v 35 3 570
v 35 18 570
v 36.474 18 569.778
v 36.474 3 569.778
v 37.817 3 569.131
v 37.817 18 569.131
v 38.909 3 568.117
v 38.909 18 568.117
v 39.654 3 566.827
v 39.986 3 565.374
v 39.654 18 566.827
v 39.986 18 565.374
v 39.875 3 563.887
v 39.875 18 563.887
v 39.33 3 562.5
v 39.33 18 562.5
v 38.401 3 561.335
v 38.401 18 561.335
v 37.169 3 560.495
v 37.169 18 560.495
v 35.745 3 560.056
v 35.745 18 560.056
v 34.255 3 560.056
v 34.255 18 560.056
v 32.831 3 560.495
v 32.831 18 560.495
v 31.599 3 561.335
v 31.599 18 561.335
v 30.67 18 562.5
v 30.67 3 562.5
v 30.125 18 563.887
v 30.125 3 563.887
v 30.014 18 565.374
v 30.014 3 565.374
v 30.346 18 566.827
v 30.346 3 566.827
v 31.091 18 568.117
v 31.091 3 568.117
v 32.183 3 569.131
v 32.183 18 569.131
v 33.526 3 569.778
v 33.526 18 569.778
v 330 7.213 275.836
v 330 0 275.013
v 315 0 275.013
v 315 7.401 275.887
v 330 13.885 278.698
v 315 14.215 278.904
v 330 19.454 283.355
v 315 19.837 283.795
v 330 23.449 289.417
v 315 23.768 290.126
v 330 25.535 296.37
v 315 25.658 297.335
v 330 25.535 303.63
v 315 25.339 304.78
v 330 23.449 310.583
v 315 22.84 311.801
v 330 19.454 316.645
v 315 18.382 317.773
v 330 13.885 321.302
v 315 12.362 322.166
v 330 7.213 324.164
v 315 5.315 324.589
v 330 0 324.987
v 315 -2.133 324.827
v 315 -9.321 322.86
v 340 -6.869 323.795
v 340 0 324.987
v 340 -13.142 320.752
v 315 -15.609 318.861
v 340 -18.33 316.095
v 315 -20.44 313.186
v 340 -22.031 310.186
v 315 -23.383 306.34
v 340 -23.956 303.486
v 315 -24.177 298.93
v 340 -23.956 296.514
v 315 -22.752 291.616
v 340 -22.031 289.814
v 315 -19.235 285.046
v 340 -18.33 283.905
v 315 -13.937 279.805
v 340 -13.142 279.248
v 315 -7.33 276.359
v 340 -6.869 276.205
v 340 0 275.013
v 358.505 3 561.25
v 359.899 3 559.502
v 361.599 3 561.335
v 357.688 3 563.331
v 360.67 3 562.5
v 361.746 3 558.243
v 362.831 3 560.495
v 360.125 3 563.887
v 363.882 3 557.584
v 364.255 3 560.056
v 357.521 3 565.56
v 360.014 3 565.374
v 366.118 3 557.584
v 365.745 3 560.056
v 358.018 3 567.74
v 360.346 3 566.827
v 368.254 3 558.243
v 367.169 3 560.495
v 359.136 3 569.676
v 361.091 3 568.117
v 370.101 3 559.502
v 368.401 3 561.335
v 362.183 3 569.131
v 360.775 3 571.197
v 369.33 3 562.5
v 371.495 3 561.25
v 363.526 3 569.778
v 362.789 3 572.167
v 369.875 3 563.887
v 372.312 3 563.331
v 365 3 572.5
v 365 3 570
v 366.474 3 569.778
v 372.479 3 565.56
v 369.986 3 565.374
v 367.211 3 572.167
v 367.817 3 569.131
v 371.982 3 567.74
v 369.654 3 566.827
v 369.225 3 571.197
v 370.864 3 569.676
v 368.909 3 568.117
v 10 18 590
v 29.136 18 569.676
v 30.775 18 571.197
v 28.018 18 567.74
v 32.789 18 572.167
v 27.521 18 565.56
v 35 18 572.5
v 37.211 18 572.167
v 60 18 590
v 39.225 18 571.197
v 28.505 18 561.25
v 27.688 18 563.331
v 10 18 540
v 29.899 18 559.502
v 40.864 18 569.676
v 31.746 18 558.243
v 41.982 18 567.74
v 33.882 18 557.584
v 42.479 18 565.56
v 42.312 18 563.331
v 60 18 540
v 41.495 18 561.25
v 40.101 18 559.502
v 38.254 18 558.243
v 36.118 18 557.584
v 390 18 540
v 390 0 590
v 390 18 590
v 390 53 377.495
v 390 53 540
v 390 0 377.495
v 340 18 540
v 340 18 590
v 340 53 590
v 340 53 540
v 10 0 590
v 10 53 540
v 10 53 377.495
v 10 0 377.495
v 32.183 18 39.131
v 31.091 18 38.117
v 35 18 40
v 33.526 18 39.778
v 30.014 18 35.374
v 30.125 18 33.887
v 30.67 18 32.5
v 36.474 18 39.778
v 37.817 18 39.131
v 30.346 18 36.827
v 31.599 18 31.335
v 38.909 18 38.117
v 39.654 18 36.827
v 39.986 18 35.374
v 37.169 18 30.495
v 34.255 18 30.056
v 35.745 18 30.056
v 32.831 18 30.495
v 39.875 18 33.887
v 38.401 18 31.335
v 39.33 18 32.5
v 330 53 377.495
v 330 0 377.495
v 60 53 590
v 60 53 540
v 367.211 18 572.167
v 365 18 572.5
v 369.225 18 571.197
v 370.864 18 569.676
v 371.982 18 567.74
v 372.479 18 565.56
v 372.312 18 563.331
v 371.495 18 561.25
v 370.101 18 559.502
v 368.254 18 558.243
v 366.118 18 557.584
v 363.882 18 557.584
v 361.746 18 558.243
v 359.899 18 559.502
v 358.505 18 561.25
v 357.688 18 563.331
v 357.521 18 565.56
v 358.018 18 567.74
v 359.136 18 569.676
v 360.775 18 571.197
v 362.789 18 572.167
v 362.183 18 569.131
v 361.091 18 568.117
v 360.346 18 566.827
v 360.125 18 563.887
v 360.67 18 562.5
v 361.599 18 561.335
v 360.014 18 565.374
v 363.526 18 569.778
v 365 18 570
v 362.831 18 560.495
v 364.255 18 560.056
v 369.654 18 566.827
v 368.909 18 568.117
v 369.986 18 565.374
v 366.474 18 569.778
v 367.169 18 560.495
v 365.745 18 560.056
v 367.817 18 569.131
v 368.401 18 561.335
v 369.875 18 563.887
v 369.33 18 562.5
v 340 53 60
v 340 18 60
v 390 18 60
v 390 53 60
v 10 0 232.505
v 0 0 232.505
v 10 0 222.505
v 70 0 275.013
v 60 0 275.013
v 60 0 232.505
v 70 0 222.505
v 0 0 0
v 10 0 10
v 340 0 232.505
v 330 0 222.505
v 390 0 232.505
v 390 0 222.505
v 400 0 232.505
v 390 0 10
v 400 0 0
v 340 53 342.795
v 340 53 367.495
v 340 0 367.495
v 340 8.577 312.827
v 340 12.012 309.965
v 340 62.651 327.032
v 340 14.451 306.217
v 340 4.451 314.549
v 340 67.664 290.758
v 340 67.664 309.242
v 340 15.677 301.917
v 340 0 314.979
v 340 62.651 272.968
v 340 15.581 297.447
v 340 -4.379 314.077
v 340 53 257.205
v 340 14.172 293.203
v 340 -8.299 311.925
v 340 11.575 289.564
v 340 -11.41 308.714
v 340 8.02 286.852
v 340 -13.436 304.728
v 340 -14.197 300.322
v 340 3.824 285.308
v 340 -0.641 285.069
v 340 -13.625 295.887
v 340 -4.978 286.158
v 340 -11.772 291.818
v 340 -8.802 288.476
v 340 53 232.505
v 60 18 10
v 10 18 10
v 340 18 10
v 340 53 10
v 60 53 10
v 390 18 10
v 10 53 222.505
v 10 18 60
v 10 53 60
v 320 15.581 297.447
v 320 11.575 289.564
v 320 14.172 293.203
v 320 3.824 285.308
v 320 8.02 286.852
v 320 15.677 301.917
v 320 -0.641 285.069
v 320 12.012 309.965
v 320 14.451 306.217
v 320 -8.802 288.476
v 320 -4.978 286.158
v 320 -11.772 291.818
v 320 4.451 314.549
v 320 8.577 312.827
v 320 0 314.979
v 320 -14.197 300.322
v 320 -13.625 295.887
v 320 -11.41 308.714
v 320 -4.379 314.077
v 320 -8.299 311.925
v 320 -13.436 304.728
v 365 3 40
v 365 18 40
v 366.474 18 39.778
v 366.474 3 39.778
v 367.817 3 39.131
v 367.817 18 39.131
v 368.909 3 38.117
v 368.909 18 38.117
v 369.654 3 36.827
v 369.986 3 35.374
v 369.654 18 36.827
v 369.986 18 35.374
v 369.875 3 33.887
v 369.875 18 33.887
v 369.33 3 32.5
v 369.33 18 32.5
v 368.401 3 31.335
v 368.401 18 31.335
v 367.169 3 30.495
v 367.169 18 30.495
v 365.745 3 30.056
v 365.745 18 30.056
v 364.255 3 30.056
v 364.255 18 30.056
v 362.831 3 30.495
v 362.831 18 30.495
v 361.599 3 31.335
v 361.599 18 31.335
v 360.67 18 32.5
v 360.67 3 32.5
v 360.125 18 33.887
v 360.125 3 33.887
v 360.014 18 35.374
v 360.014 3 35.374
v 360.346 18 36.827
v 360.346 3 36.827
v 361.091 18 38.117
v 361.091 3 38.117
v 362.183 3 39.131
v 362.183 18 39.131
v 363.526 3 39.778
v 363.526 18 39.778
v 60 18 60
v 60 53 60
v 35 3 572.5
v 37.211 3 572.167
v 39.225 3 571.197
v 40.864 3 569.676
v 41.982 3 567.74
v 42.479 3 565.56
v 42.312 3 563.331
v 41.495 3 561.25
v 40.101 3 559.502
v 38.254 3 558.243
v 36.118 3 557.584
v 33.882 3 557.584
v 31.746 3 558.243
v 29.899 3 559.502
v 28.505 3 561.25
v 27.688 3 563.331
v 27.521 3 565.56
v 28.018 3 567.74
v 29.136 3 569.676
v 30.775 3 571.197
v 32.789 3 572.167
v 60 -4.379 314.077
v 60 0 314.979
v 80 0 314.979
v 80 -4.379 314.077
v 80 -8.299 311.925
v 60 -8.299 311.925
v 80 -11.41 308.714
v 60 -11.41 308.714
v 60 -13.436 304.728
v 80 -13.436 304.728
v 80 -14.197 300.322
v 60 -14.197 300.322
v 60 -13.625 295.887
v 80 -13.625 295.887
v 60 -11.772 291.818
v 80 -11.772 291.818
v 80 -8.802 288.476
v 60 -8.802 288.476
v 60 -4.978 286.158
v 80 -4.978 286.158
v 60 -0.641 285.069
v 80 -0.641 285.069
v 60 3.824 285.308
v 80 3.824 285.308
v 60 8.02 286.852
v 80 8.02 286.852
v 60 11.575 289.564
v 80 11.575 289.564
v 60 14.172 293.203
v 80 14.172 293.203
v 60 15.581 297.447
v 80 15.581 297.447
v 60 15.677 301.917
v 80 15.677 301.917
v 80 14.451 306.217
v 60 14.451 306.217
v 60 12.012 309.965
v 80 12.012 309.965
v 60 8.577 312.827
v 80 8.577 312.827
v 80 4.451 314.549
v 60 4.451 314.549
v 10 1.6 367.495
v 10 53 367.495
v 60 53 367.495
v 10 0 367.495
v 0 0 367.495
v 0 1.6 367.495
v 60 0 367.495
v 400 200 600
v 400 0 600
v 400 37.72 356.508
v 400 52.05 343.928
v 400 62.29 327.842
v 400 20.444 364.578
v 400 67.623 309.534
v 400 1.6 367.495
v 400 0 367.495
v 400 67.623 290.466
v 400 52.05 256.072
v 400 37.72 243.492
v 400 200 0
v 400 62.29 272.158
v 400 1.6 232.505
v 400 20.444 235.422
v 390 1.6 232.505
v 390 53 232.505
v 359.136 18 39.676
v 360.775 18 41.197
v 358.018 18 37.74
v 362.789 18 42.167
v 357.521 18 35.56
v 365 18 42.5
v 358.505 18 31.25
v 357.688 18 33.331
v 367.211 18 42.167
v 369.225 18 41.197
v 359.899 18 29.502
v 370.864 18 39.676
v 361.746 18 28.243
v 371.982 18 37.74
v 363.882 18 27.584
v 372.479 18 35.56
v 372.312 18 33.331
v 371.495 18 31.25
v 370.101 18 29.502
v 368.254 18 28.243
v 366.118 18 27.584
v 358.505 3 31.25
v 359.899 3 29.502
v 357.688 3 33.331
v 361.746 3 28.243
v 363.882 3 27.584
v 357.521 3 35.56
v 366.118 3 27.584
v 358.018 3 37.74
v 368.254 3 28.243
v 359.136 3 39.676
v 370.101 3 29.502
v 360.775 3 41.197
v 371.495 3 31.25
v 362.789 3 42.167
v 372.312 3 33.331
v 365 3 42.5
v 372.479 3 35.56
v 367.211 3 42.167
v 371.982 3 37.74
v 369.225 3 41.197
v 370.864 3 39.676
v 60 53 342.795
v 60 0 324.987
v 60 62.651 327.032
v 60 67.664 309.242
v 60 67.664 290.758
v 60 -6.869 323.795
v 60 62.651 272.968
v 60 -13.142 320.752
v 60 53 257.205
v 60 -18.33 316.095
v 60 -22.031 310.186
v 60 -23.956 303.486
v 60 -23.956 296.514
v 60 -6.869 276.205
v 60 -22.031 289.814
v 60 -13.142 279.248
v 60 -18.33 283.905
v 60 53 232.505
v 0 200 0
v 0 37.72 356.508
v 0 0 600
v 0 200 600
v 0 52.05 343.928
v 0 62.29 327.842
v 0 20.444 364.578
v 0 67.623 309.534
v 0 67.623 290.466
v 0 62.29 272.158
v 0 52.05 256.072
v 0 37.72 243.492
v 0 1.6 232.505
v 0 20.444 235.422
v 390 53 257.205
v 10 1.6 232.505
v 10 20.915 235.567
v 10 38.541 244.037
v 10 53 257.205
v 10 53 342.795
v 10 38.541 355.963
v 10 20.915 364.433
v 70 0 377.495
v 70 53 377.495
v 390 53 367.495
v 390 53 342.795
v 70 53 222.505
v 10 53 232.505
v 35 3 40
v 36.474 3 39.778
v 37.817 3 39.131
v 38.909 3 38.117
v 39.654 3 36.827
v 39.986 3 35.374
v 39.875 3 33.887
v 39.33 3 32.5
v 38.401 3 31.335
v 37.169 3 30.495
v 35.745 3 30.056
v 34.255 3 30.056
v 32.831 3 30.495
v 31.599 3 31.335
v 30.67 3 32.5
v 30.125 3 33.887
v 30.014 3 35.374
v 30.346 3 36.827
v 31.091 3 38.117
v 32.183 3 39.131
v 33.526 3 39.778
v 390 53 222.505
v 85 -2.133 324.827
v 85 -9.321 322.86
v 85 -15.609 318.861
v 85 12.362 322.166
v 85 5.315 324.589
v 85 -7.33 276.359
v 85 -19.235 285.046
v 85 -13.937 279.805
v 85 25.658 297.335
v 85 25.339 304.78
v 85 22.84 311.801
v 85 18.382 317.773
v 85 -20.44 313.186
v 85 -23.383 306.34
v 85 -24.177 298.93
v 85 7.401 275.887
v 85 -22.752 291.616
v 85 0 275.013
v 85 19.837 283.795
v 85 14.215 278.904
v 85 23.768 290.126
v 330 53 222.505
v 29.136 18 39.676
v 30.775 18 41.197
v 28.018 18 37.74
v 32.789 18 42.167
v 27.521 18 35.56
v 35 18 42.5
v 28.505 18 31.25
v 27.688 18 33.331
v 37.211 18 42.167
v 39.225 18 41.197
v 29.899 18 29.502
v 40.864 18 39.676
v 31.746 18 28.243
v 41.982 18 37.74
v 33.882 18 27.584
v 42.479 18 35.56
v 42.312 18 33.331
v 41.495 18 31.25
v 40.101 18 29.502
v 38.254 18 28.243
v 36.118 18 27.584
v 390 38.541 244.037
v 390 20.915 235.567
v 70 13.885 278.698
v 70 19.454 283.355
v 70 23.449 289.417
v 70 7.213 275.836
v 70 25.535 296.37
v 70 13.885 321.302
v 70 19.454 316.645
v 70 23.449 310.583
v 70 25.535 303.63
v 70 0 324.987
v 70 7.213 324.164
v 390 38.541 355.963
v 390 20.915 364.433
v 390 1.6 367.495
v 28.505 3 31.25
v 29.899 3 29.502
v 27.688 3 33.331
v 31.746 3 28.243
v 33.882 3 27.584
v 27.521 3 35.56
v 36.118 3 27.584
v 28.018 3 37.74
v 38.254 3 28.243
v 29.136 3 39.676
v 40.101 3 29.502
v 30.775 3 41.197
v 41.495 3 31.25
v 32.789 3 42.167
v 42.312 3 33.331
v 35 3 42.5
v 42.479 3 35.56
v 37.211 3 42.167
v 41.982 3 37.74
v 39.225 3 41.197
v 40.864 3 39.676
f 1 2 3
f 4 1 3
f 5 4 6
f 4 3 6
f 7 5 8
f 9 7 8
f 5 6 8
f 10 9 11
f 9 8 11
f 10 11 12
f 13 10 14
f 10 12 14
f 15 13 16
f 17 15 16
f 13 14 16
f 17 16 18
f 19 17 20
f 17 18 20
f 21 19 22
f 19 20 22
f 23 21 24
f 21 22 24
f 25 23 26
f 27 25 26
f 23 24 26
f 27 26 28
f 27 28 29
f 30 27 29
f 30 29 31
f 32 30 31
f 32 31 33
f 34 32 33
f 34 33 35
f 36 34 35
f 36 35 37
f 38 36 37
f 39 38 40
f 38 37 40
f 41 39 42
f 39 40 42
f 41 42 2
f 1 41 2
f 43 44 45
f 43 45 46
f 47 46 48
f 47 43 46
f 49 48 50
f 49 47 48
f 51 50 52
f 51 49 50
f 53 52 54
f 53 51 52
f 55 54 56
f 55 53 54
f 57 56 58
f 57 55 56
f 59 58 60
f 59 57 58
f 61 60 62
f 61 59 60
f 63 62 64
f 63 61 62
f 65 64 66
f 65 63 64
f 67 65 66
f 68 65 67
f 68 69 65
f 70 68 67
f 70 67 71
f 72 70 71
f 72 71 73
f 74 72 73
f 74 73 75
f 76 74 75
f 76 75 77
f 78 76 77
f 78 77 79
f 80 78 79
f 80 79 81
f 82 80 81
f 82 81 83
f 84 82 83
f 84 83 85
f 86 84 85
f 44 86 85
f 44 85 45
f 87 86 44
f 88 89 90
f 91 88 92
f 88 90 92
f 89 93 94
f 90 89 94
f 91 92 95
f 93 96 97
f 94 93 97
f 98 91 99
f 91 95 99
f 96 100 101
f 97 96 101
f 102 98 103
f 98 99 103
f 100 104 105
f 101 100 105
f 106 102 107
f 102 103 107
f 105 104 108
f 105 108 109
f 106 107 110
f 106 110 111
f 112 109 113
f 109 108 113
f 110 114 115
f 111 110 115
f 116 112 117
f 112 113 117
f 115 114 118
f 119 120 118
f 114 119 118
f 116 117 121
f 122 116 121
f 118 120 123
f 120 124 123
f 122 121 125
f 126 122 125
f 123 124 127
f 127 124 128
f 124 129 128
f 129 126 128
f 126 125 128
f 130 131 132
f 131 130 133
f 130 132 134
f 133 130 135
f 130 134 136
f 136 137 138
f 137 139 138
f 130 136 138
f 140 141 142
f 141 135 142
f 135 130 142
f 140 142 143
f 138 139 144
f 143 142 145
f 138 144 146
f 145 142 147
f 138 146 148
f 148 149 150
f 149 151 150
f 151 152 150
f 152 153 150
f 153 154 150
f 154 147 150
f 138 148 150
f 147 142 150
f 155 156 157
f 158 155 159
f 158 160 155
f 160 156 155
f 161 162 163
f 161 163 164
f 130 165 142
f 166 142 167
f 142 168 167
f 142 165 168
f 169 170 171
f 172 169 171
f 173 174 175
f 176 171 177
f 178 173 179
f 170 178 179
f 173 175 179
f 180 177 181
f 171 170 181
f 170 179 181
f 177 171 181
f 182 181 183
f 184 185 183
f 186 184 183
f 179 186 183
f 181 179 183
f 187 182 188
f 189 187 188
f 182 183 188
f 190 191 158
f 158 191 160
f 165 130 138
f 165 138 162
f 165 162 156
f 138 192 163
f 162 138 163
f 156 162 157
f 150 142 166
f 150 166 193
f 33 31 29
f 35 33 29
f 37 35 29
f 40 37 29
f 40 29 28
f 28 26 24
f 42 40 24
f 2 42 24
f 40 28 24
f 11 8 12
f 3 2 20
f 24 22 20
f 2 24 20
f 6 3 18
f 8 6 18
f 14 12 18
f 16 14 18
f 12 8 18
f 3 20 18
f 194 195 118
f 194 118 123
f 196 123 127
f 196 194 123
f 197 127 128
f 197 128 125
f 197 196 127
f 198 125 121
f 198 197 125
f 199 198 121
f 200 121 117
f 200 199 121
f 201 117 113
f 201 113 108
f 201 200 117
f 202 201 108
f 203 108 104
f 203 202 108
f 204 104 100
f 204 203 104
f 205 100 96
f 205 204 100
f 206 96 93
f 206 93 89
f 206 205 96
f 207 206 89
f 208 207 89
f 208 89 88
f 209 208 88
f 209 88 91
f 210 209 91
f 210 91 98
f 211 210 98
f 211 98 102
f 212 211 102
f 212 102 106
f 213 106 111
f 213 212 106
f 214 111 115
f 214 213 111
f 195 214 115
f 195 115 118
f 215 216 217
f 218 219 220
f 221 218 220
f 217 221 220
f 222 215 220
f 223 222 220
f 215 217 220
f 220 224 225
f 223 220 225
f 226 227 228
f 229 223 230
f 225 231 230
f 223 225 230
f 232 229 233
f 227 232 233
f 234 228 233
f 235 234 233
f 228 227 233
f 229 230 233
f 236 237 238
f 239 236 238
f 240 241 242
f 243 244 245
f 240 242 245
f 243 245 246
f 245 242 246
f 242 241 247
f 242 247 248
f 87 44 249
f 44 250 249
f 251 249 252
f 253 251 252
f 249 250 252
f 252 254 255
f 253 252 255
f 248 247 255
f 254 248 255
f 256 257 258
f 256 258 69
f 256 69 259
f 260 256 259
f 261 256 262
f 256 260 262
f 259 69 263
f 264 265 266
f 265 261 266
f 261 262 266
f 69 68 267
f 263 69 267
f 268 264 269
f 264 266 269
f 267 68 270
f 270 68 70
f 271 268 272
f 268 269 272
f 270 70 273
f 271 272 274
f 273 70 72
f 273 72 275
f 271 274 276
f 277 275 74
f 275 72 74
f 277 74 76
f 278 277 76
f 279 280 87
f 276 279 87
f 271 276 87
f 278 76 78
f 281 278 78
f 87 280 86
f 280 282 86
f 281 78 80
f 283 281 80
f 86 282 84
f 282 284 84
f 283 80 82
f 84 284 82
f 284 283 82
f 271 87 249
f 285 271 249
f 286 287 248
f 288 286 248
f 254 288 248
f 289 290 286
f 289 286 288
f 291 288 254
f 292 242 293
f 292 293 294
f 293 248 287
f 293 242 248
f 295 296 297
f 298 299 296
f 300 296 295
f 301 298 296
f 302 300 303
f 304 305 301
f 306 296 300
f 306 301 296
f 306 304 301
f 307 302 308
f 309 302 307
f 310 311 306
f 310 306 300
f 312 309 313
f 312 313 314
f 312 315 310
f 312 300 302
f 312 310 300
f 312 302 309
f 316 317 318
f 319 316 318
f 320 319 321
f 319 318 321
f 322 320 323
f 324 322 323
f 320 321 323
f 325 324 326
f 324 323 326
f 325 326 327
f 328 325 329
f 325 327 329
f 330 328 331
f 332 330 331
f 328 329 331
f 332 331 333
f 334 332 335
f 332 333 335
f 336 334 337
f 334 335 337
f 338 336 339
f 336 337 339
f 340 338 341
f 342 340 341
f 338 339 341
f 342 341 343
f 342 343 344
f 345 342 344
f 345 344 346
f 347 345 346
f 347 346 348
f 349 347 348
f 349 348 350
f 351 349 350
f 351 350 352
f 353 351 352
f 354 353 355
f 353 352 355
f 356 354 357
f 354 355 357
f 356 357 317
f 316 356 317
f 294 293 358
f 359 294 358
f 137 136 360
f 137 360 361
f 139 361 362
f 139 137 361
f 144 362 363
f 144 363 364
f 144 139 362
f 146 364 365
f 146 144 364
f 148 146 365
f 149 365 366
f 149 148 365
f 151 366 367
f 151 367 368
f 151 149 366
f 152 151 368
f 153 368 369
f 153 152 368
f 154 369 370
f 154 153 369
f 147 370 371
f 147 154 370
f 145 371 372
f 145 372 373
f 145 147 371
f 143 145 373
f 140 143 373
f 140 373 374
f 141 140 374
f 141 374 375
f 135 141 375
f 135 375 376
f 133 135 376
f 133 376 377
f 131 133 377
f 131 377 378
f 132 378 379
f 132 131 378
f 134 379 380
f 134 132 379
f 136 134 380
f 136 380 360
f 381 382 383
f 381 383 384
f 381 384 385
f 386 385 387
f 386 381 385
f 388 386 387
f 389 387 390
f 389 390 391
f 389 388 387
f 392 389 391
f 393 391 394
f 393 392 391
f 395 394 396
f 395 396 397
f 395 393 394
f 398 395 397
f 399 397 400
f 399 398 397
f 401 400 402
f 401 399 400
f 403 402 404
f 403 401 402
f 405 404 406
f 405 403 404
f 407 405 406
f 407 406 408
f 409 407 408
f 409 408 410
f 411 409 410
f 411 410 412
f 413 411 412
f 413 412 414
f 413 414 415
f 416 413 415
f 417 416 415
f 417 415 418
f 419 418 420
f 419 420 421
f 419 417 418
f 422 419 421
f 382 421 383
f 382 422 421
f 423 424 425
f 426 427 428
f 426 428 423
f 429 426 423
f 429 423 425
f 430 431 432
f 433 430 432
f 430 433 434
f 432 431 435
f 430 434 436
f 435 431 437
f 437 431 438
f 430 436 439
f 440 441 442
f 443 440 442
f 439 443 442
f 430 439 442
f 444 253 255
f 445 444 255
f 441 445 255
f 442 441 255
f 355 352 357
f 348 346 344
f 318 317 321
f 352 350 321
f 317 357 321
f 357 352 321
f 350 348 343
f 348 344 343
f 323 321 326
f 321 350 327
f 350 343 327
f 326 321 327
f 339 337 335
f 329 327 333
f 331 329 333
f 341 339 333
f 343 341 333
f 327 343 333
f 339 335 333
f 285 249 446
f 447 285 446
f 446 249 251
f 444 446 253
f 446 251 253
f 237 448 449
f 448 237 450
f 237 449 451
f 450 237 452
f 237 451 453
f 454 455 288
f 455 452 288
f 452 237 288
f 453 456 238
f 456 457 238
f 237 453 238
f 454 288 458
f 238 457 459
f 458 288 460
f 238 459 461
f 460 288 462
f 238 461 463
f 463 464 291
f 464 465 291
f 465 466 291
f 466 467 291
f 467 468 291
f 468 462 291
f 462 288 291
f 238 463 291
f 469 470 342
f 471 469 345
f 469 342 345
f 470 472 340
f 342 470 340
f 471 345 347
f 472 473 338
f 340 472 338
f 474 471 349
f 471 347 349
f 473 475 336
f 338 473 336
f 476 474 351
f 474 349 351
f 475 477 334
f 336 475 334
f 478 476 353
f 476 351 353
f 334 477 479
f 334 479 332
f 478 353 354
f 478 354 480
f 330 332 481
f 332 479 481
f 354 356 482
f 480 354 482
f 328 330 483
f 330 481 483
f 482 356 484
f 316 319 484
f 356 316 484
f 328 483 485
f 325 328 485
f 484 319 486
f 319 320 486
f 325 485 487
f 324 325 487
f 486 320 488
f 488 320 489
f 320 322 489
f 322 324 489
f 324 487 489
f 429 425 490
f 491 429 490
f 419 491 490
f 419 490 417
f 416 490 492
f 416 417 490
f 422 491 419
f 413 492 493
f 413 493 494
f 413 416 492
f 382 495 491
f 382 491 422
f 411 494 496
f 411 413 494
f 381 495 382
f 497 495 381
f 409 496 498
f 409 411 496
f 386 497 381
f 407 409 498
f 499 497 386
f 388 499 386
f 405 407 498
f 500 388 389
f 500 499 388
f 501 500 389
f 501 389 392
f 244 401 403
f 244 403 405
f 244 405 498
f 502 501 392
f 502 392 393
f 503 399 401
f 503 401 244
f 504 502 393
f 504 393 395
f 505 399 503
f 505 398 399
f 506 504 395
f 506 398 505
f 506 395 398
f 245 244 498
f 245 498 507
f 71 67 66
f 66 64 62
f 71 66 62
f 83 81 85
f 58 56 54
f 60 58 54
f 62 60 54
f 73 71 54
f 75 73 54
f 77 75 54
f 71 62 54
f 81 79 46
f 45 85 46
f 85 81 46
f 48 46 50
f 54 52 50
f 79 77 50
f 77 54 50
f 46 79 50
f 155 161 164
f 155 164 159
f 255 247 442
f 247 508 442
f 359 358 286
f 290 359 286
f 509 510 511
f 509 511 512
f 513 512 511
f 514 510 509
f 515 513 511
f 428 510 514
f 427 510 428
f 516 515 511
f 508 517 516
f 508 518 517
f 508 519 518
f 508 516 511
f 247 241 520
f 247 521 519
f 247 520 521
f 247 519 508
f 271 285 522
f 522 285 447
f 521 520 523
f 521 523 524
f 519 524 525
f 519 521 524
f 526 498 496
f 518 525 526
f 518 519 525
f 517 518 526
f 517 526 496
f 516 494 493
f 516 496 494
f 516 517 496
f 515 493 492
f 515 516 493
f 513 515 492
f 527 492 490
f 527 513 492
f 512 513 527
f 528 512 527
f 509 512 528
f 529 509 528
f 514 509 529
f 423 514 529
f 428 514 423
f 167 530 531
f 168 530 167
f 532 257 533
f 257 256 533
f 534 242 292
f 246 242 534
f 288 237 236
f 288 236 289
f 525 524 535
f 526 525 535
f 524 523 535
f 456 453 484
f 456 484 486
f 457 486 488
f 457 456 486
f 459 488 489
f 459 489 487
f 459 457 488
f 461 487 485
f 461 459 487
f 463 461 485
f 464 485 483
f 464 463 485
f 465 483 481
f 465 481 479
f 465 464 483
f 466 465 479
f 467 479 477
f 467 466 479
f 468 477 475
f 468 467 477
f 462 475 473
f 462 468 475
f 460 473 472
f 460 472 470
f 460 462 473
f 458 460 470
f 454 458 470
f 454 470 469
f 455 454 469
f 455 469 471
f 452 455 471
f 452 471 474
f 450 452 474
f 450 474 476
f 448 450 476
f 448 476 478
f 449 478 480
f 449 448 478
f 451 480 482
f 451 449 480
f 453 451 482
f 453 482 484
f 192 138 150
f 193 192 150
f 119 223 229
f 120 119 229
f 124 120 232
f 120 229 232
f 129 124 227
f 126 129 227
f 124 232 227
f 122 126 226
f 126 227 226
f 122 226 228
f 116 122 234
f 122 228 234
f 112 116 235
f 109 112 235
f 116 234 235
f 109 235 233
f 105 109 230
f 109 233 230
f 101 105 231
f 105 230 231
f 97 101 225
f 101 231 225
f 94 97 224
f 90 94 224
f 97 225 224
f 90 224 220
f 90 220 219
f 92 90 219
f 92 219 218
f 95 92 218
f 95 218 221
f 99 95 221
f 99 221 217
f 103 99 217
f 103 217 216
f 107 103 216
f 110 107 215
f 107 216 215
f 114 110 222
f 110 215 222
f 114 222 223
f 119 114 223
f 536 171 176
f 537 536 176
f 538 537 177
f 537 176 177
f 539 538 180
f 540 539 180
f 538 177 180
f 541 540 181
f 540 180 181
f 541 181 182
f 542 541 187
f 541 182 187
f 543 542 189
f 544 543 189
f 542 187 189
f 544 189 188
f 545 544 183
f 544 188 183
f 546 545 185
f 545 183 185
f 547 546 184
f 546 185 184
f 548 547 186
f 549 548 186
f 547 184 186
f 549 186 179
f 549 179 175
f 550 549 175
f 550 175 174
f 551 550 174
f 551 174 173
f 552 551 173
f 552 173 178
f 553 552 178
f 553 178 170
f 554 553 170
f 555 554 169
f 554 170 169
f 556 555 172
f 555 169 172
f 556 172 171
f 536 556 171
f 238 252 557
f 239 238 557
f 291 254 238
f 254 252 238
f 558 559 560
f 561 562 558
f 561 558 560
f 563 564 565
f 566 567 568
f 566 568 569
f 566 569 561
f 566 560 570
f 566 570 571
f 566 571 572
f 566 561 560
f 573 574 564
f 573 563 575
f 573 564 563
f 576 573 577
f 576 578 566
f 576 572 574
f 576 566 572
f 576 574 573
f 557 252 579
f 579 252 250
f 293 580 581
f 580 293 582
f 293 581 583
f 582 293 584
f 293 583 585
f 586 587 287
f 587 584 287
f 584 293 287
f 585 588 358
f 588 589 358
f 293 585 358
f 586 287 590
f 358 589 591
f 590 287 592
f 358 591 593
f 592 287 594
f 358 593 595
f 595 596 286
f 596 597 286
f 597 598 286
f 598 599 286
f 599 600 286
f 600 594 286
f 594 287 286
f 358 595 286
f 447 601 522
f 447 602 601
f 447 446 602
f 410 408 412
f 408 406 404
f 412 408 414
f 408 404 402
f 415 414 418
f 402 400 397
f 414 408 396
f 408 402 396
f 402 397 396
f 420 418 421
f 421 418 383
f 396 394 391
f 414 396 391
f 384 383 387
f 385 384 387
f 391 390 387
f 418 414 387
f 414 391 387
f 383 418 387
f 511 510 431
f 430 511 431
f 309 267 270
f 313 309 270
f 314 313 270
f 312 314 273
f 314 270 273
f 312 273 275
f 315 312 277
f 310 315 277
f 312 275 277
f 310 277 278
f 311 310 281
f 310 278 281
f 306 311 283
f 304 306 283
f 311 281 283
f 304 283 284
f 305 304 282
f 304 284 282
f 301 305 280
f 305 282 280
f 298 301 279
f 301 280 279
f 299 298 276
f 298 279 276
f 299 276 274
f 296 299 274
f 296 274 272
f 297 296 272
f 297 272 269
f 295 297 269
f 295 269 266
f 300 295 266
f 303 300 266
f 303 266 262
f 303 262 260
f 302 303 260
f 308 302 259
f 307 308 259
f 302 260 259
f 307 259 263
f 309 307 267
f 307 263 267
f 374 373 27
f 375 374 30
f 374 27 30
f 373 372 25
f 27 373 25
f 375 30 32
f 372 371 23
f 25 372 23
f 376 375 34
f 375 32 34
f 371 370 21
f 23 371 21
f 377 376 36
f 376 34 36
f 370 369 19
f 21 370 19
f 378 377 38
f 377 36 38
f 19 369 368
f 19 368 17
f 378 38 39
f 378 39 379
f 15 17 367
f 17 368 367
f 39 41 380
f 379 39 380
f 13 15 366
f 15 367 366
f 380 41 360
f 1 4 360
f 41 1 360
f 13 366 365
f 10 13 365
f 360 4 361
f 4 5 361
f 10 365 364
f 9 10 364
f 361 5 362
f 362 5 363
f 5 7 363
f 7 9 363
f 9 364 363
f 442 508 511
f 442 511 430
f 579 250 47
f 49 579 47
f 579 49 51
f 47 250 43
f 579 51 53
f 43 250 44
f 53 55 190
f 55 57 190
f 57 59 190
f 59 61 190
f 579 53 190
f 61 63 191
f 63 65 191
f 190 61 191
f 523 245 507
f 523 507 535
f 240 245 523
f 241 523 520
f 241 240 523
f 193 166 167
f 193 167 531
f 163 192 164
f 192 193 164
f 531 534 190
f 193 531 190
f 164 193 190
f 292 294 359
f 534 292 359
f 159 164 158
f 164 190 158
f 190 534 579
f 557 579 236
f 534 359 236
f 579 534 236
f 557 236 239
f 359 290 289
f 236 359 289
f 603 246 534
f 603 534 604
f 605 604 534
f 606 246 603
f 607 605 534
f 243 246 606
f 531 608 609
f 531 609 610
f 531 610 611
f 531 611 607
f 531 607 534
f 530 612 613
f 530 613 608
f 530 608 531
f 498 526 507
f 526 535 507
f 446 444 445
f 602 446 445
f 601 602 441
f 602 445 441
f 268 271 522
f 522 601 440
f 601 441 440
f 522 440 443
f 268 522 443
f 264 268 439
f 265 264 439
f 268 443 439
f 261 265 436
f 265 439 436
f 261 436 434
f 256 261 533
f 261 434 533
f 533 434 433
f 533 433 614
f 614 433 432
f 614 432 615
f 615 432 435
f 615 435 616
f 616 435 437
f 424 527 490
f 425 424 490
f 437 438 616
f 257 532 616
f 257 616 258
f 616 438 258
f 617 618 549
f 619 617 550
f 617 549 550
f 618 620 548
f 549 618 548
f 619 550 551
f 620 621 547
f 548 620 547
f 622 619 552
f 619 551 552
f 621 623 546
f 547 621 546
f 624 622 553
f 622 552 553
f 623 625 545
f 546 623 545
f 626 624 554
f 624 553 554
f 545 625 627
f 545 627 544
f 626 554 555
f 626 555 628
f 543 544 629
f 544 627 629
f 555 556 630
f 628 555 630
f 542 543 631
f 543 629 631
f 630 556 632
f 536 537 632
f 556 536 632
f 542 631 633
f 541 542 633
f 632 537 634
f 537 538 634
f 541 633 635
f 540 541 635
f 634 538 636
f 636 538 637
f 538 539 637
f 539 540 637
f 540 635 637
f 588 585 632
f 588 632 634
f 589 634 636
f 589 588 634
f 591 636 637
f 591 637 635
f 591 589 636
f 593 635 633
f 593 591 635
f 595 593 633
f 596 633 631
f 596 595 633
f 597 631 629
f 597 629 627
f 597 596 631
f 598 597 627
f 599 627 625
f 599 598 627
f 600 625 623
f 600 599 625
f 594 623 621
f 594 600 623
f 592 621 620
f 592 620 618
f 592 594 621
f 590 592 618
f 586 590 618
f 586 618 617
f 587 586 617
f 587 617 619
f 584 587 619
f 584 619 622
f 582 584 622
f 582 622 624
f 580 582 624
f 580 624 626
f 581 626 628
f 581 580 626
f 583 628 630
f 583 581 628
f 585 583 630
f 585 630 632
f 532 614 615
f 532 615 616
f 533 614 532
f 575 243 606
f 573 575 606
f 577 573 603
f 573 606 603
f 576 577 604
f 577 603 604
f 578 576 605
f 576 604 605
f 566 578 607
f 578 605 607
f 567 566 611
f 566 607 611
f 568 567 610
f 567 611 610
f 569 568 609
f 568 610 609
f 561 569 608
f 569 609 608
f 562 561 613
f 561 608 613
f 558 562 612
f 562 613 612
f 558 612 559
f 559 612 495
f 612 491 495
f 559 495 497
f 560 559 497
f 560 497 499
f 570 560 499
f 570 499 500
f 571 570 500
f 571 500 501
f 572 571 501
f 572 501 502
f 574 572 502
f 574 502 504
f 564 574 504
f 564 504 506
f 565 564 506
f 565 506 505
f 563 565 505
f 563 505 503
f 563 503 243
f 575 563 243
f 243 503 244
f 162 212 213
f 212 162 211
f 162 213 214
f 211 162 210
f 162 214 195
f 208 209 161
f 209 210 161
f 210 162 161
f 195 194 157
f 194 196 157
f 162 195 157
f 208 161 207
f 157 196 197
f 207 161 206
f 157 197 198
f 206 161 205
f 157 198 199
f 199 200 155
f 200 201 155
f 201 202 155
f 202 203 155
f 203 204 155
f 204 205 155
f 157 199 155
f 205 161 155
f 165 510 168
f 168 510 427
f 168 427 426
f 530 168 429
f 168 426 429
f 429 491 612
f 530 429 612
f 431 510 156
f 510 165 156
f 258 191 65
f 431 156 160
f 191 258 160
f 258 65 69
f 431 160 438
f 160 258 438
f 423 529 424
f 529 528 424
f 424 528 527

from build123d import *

# Parameters (mm, degrees)
SKETCH1_W                = 400
SKETCH1_H                = 200
BOSS_EXTRUDE1_DEPTH      = 600
SHELL1_T                 = -10
BOSS_EXTRUDE2_DEPTH      = 25
BOSS_EXTRUDE2_DEPTH_BACK = 10
SKETCH2_W                = 60
SKETCH2_H                = 60
SKETCH3_R                = 7.5
SKETCH3_R_2              = 5
BOSS_EXTRUDE3_DEPTH      = 15
LPATTERN1_COUNT          = 2
LPATTERN1_PITCH          = 330
LPATTERN1_COUNT_DIR2     = 2
LPATTERN1_PITCH_DIR2     = 530
SKETCH4_R                = 15
CUT_EXTRUDE1_DEPTH       = 749.331477355
BOSS_EXTRUDE4_START      = 15
SKETCH5_R                = 25
SKETCH5_R_2              = 15
BOSS_EXTRUDE4_DEPTH      = 15
THICKEN1_START           = 375
THICKEN1_OUTLINE_W       = 31
THICKEN1_OUTLINE_H       = 30
THICKEN1_DEPTH           = 0.5
THICKEN2_START           = 24.5
THICKEN2_OUTLINE_W       = 31
THICKEN2_OUTLINE_H       = 30
THICKEN2_DEPTH           = 0.5
BOSS_EXTRUDE6_REACH      = 737.941
SKETCH7_W                = 380
SKETCH7_H                = 580
SKETCH10_R               = 67.5
CUT_EXTRUDE2_DEPTH       = 60
SKETCH11_R               = 25
BOSS_EXTRUDE7_DEPTH      = 25
BOSS_EXTRUDE8_DEPTH      = 55
SKETCH11_4_R             = 15
CUT_EXTRUDE4_DEPTH       = 20


# Read off the part's stored shape, not the designer's step: Thicken1, Thicken2
with BuildPart() as part:
    # Sketch1 → Boss-Extrude1 (new body)
    with BuildSketch(Plane.XY):
        with Locations((200, 100)):
            Rectangle(SKETCH1_W, SKETCH1_H)
    extrude(amount=BOSS_EXTRUDE1_DEPTH)

    # Shell1
    shell1_openings = [part.faces().sort_by_distance(p)[0] for p in [
        (200, 0, 300),
    ]]
    offset(amount=SHELL1_T, openings=shell1_openings, kind=Kind.INTERSECTION)

    # Sketch2 → Boss-Extrude2 (add, two sides: drawn at the far end of the back side and taken through both)
    with BuildSketch(Plane(origin=(0, 28, 0), x_dir=(1, 0, 0), z_dir=(0, 1, 0)).offset(-BOSS_EXTRUDE2_DEPTH_BACK)):
        with Locations((370, -570)):
            Rectangle(SKETCH2_W, SKETCH2_H)
        with Locations((30, -570)):
            Rectangle(SKETCH2_W, SKETCH2_H)
        with Locations((370, -30)):
            Rectangle(SKETCH2_W, SKETCH2_H)
        with Locations((30, -30)):
            Rectangle(SKETCH2_W, SKETCH2_H)
    extrude(amount=BOSS_EXTRUDE2_DEPTH + BOSS_EXTRUDE2_DEPTH_BACK)

    # Sketch3 → Boss-Extrude3 (add)
    with BuildSketch(Plane(origin=(0, 18, 0), x_dir=(1, 0, 0), z_dir=(0, 1, 0))):
        with Locations(Location((35, -565, 0), (0, 0, 270))):
            Circle(SKETCH3_R)
        with Locations(Location((35, -565, 0), (0, 0, 270))):
            Circle(SKETCH3_R_2, mode=Mode.SUBTRACT)
    boss_extrude3 = extrude(amount=-BOSS_EXTRUDE3_DEPTH)

    # LPattern1: Boss-Extrude3 2 × 2
    with Locations(*[(i * LPATTERN1_PITCH, 0, -j * LPATTERN1_PITCH_DIR2) for i in range(LPATTERN1_COUNT) for j in range(LPATTERN1_COUNT_DIR2) if (i, j) != (0, 0)]):
        add(boss_extrude3)

    # Sketch4 → Cut-Extrude1 (cut, through all)
    with BuildSketch(Plane(origin=(0, 0, 0), x_dir=(0, 0, -1), z_dir=(1, 0, 0))):
        with Locations((-300, 0.8)):
            Circle(SKETCH4_R)
    extrude(amount=CUT_EXTRUDE1_DEPTH, mode=Mode.SUBTRACT)

    # Sketch5 → Boss-Extrude4 (add)
    with BuildSketch(Plane.ZY.offset(-390).offset(BOSS_EXTRUDE4_START)):
        with Locations(Location((300, 0.8, 0), (0, 0, 181.833778))):
            Circle(SKETCH5_R)
        with Locations((300, 0.8)):
            Circle(SKETCH5_R_2, mode=Mode.SUBTRACT)
    boss_extrude4 = extrude(amount=-BOSS_EXTRUDE4_DEPTH)

    # Thicken1 outline → Thicken1 (add)
    with BuildSketch(Plane.YZ.offset(THICKEN1_START)):
        with Locations((0.5, 300)):
            Rectangle(THICKEN1_OUTLINE_W, THICKEN1_OUTLINE_H)
    extrude(amount=THICKEN1_DEPTH)

    # Mirror5: Boss-Extrude4 across plane
    add(boss_extrude4.mirror(Plane(origin=(200, 0, 0), x_dir=(0, 0, 1), z_dir=(1, 0, 0))))

    # Thicken2 outline → Thicken2 (add)
    with BuildSketch(Plane.YZ.offset(THICKEN2_START)):
        with Locations((0.5, 300)):
            Rectangle(THICKEN2_OUTLINE_W, THICKEN2_OUTLINE_H)
    extrude(amount=THICKEN2_DEPTH)

    # Sketch7 → Boss-Extrude6 (add, up to next)
    with BuildSketch(Plane(origin=(0, 53, 0), x_dir=(1, 0, 0), z_dir=(0, 1, 0)), mode=Mode.PRIVATE) as boss_extrude6_sk1:
        with Locations((200, -300)):
            Rectangle(SKETCH7_W, SKETCH7_H)
    boss_extrude6_tool1 = extrude(boss_extrude6_sk1.sketch, amount=BOSS_EXTRUDE6_REACH, mode=Mode.PRIVATE) - part.part
    add(boss_extrude6_tool1.solids().sort_by_distance((200, 53, 300))[0])

    # Sketch10 → Cut-Extrude2 (cut)
    with BuildSketch(Plane(origin=(0, 0, 0), x_dir=(0, 0, -1), z_dir=(1, 0, 0))):
        with Locations((-300, 0.8)):
            Circle(SKETCH10_R)
    cut_extrude2 = extrude(amount=CUT_EXTRUDE2_DEPTH, mode=Mode.SUBTRACT)



with BuildPart() as body_2:
    # Sketch11 → Boss-Extrude7 (new body)
    with BuildSketch(Plane(origin=(60, 0, 0), x_dir=(0, 0, -1), z_dir=(1, 0, 0))):
        with Locations(Location((-300, 0.8, 0), (0, 0, 358.166222))):
            Circle(SKETCH11_R)
    boss_extrude7 = extrude(amount=BOSS_EXTRUDE7_DEPTH)


with BuildPart() as part_1:
    add(part.part)

    add(body_2.part)  # Boss-Extrude8 merges body 2
    # Sketch12 → Boss-Extrude8 (add)
    with BuildSketch(Plane.XZ):
        Polygon((0, 367.495259093), (60, 367.495259093), (60, 325), (60, 274.564639087), (60, 232.504740907), (0, 232.504740907), (0, 222.504740907), (70, 222.504740907), (70, 274.564639087), (70, 325), (70, 377.495259093), (0, 377.495259093), align=None)
    boss_extrude8 = extrude(amount=-BOSS_EXTRUDE8_DEPTH)

    # Sketch11<4> → Cut-Extrude4 (cut)
    with BuildSketch(Plane(origin=(60, 0, 0), x_dir=(0, 0, -1), z_dir=(1, 0, 0))):
        with Locations(Location((-300, 0.8, 0), (0, 0, 183.057225428))):
            Circle(SKETCH11_4_R)
    cut_extrude4 = extrude(amount=CUT_EXTRUDE4_DEPTH, mode=Mode.SUBTRACT)

    # Mirror7: Cut-Extrude2 across plane
    add(cut_extrude2.mirror(Plane(origin=(200, 0, 0), x_dir=(0, 0, 1), z_dir=(1, 0, 0))), mode=Mode.SUBTRACT)

    # Mirror10: Boss-Extrude8 across plane
    add(boss_extrude8.mirror(Plane(origin=(200, 0, 0), x_dir=(0, 0, 1), z_dir=(1, 0, 0))))

    # Mirror14: Boss-Extrude7 across plane
    add(boss_extrude7.mirror(Plane(origin=(200, 0, 0), x_dir=(0, 0, 1), z_dir=(1, 0, 0))))

    # Mirror15: Cut-Extrude4 across plane
    add(cut_extrude4.mirror(Plane(origin=(200, 0, 0), x_dir=(0, 0, 1), z_dir=(1, 0, 0))), mode=Mode.SUBTRACT)


solid = part_1.part
